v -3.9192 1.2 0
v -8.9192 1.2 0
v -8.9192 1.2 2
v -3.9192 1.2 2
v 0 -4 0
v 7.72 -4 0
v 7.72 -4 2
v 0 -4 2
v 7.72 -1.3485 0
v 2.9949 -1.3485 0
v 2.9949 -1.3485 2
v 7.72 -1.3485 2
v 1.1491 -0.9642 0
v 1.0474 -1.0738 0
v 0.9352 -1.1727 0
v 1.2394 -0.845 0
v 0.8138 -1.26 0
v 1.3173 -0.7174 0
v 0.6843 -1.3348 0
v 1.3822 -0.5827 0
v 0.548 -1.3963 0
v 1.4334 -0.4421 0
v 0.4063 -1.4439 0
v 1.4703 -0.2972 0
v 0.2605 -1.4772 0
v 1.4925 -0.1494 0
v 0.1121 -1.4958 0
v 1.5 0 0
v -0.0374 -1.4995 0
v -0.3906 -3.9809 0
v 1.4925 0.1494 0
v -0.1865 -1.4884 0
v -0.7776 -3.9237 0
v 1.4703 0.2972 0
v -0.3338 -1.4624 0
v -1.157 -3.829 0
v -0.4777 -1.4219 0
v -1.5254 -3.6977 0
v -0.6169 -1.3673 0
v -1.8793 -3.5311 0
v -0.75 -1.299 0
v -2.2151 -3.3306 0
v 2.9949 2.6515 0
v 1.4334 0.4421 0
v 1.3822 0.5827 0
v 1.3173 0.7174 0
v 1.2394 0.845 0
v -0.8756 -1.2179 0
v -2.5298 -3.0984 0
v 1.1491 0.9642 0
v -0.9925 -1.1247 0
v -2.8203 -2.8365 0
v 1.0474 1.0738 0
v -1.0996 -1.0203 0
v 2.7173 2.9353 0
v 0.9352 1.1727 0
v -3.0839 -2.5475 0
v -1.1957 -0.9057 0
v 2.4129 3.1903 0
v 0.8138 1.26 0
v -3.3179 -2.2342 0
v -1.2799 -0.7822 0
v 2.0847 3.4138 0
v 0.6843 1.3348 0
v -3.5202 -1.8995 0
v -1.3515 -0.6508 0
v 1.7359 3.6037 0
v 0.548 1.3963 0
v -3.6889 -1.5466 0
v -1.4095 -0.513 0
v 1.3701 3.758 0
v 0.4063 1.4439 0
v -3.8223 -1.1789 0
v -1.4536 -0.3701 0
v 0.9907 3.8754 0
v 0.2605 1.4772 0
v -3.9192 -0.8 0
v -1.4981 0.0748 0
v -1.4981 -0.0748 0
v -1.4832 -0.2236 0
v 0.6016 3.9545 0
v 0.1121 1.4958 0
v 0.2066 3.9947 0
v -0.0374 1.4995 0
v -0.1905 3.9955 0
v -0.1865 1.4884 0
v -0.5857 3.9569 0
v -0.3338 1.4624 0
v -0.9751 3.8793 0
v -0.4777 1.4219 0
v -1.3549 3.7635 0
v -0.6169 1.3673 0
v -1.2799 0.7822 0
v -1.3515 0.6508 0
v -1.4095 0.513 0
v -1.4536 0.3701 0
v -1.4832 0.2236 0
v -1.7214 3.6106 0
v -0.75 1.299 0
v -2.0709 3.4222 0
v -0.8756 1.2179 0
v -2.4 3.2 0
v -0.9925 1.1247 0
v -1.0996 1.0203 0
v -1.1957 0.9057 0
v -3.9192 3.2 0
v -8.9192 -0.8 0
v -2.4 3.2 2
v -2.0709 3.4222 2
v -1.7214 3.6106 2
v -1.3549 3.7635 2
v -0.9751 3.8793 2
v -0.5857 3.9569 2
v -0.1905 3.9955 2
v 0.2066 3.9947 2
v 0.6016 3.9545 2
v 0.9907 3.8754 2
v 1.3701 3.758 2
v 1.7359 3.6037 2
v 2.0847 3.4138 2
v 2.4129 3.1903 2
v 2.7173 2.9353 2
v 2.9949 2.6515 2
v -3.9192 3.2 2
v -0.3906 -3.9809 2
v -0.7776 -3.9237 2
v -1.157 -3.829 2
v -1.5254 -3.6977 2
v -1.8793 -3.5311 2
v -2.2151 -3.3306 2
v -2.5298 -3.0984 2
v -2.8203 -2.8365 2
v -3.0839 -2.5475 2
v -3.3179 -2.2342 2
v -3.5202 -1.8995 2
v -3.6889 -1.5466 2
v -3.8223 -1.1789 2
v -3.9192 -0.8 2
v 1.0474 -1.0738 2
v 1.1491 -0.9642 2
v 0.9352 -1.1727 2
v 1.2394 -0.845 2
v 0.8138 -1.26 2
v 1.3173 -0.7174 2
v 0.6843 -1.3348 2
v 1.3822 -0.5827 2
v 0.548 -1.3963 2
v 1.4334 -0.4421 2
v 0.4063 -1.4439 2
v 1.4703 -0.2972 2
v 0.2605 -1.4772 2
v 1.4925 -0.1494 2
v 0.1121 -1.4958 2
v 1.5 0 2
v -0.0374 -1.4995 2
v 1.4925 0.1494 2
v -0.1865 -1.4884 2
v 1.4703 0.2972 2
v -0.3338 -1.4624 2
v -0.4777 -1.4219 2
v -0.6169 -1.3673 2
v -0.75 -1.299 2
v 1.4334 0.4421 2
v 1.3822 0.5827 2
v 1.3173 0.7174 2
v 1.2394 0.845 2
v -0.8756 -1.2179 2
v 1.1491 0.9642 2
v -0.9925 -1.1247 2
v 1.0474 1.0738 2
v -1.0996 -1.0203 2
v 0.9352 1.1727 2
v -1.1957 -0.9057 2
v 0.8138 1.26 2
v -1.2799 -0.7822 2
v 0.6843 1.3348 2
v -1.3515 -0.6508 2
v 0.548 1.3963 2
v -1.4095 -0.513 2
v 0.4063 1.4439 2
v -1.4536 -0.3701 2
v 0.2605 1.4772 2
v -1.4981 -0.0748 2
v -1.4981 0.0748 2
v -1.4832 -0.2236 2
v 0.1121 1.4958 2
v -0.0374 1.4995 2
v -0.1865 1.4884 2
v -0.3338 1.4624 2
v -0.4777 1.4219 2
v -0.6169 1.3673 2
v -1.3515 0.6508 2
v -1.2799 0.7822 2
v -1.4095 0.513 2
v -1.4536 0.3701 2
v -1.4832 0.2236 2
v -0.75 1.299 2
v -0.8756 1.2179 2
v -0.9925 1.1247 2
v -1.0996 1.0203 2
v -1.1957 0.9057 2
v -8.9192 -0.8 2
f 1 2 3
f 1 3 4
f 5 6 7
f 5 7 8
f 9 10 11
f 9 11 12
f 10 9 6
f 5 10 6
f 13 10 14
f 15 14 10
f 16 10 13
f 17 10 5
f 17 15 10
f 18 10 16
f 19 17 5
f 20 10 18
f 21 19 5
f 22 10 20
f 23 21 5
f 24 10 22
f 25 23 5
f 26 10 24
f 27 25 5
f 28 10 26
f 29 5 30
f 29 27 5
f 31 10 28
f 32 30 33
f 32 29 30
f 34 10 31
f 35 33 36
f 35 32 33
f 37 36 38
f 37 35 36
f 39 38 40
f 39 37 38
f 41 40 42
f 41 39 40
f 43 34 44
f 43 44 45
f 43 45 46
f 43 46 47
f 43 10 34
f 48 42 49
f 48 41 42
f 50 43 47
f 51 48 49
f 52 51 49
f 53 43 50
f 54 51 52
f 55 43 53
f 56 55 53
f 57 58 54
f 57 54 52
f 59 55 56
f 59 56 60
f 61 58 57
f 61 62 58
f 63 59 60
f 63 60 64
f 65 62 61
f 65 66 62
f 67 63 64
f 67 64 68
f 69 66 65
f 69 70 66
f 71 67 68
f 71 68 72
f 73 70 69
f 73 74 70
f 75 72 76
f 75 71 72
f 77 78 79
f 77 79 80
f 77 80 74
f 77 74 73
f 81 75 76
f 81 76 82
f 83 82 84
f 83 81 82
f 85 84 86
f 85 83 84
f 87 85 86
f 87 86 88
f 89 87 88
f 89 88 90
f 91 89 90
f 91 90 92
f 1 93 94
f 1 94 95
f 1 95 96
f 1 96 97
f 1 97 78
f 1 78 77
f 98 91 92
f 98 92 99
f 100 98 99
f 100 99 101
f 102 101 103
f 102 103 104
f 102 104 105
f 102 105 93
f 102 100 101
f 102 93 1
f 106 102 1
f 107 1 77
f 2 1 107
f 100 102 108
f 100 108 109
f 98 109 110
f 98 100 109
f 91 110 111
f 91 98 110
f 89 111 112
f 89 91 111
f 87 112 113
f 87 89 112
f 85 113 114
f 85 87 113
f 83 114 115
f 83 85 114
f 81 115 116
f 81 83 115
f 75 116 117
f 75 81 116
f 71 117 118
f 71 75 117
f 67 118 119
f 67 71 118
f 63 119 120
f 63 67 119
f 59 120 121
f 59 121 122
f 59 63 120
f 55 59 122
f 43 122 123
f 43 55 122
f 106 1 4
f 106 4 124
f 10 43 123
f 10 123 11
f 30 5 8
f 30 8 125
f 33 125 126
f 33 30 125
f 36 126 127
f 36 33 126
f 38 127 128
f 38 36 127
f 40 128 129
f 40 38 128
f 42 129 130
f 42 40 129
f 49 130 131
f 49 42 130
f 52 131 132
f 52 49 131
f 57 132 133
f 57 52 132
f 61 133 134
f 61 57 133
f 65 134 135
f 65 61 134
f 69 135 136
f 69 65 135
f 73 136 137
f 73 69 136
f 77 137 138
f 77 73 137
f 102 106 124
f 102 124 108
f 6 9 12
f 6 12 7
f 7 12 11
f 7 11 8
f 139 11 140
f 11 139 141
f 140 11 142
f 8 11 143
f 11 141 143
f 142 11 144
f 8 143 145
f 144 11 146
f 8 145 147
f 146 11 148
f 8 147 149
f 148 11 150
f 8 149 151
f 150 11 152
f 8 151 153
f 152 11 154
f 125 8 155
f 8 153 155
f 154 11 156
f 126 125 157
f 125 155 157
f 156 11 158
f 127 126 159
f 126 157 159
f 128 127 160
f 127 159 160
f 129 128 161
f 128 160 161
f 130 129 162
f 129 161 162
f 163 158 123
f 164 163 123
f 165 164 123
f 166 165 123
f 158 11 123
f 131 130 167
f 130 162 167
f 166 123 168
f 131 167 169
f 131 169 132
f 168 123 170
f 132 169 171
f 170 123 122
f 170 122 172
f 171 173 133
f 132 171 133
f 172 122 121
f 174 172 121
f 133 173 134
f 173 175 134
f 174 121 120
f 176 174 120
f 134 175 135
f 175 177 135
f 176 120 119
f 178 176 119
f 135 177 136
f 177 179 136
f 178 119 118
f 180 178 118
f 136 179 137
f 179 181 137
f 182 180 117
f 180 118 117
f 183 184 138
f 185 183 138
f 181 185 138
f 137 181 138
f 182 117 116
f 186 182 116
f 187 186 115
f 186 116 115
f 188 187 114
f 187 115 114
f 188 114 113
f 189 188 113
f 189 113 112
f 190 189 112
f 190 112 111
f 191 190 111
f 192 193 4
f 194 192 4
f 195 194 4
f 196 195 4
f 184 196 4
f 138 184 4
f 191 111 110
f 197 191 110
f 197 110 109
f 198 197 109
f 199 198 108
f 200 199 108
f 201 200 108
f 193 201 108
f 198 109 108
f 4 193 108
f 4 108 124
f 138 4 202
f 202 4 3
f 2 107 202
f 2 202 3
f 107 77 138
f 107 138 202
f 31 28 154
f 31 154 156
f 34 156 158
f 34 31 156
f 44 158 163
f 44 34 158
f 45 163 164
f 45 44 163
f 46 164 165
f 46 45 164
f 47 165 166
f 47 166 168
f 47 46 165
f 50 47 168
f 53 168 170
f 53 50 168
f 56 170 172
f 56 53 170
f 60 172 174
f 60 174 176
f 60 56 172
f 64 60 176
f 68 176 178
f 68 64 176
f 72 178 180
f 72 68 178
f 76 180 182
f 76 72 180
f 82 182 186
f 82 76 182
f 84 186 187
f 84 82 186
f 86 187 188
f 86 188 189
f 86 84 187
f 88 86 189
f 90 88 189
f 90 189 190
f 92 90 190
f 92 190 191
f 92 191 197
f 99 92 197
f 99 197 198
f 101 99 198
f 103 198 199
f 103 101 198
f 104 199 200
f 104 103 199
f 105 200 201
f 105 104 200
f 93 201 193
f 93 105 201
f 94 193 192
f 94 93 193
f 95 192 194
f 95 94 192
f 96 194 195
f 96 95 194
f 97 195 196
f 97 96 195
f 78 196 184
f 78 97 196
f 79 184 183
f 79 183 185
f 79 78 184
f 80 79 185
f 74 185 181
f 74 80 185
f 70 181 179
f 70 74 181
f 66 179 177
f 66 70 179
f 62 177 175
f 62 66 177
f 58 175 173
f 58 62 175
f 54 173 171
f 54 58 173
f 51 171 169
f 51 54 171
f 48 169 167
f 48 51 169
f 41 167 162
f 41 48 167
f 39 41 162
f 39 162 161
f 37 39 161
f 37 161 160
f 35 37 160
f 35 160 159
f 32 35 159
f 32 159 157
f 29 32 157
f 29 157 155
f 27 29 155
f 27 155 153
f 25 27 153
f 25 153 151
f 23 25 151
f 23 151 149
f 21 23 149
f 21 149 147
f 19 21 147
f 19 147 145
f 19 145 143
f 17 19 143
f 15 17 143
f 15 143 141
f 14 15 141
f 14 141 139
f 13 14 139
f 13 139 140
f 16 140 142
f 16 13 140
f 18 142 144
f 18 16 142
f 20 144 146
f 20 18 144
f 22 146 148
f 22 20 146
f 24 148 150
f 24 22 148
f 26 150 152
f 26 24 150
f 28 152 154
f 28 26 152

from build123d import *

# Parameters (mm, degrees)
SKETCH1_R           = 1.5
BOSS_EXTRUDE1_DEPTH = 2


with BuildPart() as part:
    # Sketch1 → Boss-Extrude1 (new body)
    with BuildSketch(Plane.XY):
        with BuildLine():
            Line((7.72, -4), (0, -4))
            ThreePointArc((0, -4), (-2.529822128, -3.098386677), (-3.919183588, -0.8))
            Line((-3.919183588, -0.8), (-8.919183588, -0.8))
            Line((-8.919183588, -0.8), (-8.919183588, 1.2))
            Line((-8.919183588, 1.2), (-3.919183588, 1.2))
            Line((-3.919183588, 1.2), (-3.919183588, 3.2))
            Line((-3.919183588, 3.2), (-2.4, 3.2))
            ThreePointArc((-2.4, 3.2), (0.404610957, 3.979483631), (2.994944065, 2.651473185))
            Line((2.994944065, 2.651473185), (2.994944065, -1.348526815))
            Line((2.994944065, -1.348526815), (7.72, -1.348526815))
            Line((7.72, -1.348526815), (7.72, -4))
        make_face()
        Circle(SKETCH1_R, mode=Mode.SUBTRACT)
    extrude(amount=BOSS_EXTRUDE1_DEPTH)


solid = part.part
